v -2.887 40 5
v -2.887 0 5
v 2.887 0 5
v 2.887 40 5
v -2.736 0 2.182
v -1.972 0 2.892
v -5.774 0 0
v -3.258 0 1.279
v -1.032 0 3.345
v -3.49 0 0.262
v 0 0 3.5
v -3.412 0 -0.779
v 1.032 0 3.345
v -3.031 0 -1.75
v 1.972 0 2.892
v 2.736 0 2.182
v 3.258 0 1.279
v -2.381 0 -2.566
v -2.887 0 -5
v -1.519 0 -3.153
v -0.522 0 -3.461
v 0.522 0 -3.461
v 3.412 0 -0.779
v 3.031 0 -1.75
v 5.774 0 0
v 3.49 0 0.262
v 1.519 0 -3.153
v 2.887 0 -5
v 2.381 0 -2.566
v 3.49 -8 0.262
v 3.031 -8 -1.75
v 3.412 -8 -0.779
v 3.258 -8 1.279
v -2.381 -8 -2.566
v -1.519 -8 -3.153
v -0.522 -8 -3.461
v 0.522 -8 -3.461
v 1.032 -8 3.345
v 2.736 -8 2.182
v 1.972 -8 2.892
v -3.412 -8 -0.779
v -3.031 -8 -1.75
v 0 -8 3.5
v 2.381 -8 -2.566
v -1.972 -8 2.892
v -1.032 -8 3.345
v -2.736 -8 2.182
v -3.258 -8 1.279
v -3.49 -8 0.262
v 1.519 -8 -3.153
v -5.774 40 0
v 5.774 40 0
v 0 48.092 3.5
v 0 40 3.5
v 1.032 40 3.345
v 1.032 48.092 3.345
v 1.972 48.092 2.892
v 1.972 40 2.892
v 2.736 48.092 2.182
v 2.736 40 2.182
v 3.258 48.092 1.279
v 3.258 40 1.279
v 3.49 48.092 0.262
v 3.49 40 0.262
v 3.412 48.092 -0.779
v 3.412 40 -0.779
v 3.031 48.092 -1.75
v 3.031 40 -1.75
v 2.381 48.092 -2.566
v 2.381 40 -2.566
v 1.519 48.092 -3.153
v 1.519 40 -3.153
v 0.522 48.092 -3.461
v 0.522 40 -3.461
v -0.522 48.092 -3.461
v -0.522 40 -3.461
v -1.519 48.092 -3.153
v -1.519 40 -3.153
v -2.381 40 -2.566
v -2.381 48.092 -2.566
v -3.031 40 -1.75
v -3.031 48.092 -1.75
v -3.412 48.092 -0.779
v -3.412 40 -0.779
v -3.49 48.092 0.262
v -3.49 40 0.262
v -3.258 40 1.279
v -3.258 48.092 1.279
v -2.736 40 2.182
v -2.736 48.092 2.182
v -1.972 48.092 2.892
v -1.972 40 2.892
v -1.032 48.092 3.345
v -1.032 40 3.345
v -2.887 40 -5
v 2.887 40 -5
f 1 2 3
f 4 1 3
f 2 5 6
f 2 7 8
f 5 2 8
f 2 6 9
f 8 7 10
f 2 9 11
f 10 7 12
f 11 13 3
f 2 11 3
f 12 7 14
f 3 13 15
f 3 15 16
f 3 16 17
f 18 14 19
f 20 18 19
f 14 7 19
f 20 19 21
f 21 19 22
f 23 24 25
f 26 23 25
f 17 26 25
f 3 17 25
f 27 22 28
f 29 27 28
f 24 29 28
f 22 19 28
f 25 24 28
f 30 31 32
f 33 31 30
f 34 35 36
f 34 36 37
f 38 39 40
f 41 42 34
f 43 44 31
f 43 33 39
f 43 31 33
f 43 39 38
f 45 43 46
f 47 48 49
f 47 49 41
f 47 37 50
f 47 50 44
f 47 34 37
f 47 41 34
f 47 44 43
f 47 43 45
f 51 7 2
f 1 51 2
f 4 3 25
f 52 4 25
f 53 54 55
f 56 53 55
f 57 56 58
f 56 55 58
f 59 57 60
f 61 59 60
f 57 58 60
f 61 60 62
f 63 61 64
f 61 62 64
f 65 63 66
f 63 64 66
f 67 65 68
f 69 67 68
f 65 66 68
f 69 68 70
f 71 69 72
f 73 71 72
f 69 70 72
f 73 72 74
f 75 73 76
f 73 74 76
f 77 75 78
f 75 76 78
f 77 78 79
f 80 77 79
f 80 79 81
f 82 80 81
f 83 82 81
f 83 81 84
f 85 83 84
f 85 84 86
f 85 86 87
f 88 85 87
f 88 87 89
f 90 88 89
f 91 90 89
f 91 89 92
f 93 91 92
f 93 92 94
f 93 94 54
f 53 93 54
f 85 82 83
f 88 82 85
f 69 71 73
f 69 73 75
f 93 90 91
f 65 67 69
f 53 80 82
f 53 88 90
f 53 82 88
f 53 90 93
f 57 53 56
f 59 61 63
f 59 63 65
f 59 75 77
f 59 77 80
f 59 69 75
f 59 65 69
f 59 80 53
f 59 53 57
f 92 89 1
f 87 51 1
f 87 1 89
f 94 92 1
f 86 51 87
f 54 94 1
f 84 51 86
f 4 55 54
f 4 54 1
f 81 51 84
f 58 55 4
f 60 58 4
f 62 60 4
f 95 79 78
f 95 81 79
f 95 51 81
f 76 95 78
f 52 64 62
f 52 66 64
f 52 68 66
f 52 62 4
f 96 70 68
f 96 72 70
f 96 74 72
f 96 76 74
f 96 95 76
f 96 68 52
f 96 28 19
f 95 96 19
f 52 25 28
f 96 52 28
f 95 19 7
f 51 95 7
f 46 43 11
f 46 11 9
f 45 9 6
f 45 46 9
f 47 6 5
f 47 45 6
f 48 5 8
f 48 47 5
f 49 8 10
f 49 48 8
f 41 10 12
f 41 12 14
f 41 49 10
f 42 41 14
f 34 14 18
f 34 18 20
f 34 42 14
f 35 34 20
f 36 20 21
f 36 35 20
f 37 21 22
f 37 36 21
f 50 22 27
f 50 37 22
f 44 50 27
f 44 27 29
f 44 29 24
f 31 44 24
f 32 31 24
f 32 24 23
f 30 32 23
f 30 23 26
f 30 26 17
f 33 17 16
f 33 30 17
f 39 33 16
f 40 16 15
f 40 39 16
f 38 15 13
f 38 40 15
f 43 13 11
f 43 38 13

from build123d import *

# Parameters (mm, degrees)
BOSS_EXTRUDE1_DEPTH = 40
SKETCH5_R           = 3.5
BOSS_EXTRUDE2_DEPTH = 8.091605471
SKETCH5_2_R         = 3.5
BOSS_EXTRUDE3_DEPTH = 8
BOSS_EXTRUDE6_START = 8
SKETCH9_R           = 3.5
BOSS_EXTRUDE6_DEPTH = 8


with BuildPart() as part:
    # Sketch3 → Boss-Extrude1 (new body)
    with BuildSketch(Plane(origin=(0, 0, 0), x_dir=(1, 0, 0), z_dir=(0, 1, 0))):
        Polygon((-5.773502692, 0), (-2.886751346, -5), (2.886751346, -5), (5.773502692, 0), (2.886751346, 5), (-2.886751346, 5), align=None)
    extrude(amount=BOSS_EXTRUDE1_DEPTH)

    # Sketch5 → Boss-Extrude2 (add)
    with BuildSketch(Plane(origin=(0, 40, 0), x_dir=(1, 0, 0), z_dir=(0, 1, 0))):
        Circle(SKETCH5_R)
    extrude(amount=BOSS_EXTRUDE2_DEPTH)

    # Sketch5<2> → Boss-Extrude3 (add)
    with BuildSketch(Plane(origin=(0, 40, 0), x_dir=(1, 0, 0), z_dir=(0, 1, 0))):
        Circle(SKETCH5_2_R)
    extrude(amount=BOSS_EXTRUDE3_DEPTH)

    # Sketch9 → Boss-Extrude6 (add)
    with BuildSketch(Plane.XZ.offset(BOSS_EXTRUDE6_START)):
        Circle(SKETCH9_R)
    extrude(amount=-BOSS_EXTRUDE6_DEPTH)


solid = part.part
